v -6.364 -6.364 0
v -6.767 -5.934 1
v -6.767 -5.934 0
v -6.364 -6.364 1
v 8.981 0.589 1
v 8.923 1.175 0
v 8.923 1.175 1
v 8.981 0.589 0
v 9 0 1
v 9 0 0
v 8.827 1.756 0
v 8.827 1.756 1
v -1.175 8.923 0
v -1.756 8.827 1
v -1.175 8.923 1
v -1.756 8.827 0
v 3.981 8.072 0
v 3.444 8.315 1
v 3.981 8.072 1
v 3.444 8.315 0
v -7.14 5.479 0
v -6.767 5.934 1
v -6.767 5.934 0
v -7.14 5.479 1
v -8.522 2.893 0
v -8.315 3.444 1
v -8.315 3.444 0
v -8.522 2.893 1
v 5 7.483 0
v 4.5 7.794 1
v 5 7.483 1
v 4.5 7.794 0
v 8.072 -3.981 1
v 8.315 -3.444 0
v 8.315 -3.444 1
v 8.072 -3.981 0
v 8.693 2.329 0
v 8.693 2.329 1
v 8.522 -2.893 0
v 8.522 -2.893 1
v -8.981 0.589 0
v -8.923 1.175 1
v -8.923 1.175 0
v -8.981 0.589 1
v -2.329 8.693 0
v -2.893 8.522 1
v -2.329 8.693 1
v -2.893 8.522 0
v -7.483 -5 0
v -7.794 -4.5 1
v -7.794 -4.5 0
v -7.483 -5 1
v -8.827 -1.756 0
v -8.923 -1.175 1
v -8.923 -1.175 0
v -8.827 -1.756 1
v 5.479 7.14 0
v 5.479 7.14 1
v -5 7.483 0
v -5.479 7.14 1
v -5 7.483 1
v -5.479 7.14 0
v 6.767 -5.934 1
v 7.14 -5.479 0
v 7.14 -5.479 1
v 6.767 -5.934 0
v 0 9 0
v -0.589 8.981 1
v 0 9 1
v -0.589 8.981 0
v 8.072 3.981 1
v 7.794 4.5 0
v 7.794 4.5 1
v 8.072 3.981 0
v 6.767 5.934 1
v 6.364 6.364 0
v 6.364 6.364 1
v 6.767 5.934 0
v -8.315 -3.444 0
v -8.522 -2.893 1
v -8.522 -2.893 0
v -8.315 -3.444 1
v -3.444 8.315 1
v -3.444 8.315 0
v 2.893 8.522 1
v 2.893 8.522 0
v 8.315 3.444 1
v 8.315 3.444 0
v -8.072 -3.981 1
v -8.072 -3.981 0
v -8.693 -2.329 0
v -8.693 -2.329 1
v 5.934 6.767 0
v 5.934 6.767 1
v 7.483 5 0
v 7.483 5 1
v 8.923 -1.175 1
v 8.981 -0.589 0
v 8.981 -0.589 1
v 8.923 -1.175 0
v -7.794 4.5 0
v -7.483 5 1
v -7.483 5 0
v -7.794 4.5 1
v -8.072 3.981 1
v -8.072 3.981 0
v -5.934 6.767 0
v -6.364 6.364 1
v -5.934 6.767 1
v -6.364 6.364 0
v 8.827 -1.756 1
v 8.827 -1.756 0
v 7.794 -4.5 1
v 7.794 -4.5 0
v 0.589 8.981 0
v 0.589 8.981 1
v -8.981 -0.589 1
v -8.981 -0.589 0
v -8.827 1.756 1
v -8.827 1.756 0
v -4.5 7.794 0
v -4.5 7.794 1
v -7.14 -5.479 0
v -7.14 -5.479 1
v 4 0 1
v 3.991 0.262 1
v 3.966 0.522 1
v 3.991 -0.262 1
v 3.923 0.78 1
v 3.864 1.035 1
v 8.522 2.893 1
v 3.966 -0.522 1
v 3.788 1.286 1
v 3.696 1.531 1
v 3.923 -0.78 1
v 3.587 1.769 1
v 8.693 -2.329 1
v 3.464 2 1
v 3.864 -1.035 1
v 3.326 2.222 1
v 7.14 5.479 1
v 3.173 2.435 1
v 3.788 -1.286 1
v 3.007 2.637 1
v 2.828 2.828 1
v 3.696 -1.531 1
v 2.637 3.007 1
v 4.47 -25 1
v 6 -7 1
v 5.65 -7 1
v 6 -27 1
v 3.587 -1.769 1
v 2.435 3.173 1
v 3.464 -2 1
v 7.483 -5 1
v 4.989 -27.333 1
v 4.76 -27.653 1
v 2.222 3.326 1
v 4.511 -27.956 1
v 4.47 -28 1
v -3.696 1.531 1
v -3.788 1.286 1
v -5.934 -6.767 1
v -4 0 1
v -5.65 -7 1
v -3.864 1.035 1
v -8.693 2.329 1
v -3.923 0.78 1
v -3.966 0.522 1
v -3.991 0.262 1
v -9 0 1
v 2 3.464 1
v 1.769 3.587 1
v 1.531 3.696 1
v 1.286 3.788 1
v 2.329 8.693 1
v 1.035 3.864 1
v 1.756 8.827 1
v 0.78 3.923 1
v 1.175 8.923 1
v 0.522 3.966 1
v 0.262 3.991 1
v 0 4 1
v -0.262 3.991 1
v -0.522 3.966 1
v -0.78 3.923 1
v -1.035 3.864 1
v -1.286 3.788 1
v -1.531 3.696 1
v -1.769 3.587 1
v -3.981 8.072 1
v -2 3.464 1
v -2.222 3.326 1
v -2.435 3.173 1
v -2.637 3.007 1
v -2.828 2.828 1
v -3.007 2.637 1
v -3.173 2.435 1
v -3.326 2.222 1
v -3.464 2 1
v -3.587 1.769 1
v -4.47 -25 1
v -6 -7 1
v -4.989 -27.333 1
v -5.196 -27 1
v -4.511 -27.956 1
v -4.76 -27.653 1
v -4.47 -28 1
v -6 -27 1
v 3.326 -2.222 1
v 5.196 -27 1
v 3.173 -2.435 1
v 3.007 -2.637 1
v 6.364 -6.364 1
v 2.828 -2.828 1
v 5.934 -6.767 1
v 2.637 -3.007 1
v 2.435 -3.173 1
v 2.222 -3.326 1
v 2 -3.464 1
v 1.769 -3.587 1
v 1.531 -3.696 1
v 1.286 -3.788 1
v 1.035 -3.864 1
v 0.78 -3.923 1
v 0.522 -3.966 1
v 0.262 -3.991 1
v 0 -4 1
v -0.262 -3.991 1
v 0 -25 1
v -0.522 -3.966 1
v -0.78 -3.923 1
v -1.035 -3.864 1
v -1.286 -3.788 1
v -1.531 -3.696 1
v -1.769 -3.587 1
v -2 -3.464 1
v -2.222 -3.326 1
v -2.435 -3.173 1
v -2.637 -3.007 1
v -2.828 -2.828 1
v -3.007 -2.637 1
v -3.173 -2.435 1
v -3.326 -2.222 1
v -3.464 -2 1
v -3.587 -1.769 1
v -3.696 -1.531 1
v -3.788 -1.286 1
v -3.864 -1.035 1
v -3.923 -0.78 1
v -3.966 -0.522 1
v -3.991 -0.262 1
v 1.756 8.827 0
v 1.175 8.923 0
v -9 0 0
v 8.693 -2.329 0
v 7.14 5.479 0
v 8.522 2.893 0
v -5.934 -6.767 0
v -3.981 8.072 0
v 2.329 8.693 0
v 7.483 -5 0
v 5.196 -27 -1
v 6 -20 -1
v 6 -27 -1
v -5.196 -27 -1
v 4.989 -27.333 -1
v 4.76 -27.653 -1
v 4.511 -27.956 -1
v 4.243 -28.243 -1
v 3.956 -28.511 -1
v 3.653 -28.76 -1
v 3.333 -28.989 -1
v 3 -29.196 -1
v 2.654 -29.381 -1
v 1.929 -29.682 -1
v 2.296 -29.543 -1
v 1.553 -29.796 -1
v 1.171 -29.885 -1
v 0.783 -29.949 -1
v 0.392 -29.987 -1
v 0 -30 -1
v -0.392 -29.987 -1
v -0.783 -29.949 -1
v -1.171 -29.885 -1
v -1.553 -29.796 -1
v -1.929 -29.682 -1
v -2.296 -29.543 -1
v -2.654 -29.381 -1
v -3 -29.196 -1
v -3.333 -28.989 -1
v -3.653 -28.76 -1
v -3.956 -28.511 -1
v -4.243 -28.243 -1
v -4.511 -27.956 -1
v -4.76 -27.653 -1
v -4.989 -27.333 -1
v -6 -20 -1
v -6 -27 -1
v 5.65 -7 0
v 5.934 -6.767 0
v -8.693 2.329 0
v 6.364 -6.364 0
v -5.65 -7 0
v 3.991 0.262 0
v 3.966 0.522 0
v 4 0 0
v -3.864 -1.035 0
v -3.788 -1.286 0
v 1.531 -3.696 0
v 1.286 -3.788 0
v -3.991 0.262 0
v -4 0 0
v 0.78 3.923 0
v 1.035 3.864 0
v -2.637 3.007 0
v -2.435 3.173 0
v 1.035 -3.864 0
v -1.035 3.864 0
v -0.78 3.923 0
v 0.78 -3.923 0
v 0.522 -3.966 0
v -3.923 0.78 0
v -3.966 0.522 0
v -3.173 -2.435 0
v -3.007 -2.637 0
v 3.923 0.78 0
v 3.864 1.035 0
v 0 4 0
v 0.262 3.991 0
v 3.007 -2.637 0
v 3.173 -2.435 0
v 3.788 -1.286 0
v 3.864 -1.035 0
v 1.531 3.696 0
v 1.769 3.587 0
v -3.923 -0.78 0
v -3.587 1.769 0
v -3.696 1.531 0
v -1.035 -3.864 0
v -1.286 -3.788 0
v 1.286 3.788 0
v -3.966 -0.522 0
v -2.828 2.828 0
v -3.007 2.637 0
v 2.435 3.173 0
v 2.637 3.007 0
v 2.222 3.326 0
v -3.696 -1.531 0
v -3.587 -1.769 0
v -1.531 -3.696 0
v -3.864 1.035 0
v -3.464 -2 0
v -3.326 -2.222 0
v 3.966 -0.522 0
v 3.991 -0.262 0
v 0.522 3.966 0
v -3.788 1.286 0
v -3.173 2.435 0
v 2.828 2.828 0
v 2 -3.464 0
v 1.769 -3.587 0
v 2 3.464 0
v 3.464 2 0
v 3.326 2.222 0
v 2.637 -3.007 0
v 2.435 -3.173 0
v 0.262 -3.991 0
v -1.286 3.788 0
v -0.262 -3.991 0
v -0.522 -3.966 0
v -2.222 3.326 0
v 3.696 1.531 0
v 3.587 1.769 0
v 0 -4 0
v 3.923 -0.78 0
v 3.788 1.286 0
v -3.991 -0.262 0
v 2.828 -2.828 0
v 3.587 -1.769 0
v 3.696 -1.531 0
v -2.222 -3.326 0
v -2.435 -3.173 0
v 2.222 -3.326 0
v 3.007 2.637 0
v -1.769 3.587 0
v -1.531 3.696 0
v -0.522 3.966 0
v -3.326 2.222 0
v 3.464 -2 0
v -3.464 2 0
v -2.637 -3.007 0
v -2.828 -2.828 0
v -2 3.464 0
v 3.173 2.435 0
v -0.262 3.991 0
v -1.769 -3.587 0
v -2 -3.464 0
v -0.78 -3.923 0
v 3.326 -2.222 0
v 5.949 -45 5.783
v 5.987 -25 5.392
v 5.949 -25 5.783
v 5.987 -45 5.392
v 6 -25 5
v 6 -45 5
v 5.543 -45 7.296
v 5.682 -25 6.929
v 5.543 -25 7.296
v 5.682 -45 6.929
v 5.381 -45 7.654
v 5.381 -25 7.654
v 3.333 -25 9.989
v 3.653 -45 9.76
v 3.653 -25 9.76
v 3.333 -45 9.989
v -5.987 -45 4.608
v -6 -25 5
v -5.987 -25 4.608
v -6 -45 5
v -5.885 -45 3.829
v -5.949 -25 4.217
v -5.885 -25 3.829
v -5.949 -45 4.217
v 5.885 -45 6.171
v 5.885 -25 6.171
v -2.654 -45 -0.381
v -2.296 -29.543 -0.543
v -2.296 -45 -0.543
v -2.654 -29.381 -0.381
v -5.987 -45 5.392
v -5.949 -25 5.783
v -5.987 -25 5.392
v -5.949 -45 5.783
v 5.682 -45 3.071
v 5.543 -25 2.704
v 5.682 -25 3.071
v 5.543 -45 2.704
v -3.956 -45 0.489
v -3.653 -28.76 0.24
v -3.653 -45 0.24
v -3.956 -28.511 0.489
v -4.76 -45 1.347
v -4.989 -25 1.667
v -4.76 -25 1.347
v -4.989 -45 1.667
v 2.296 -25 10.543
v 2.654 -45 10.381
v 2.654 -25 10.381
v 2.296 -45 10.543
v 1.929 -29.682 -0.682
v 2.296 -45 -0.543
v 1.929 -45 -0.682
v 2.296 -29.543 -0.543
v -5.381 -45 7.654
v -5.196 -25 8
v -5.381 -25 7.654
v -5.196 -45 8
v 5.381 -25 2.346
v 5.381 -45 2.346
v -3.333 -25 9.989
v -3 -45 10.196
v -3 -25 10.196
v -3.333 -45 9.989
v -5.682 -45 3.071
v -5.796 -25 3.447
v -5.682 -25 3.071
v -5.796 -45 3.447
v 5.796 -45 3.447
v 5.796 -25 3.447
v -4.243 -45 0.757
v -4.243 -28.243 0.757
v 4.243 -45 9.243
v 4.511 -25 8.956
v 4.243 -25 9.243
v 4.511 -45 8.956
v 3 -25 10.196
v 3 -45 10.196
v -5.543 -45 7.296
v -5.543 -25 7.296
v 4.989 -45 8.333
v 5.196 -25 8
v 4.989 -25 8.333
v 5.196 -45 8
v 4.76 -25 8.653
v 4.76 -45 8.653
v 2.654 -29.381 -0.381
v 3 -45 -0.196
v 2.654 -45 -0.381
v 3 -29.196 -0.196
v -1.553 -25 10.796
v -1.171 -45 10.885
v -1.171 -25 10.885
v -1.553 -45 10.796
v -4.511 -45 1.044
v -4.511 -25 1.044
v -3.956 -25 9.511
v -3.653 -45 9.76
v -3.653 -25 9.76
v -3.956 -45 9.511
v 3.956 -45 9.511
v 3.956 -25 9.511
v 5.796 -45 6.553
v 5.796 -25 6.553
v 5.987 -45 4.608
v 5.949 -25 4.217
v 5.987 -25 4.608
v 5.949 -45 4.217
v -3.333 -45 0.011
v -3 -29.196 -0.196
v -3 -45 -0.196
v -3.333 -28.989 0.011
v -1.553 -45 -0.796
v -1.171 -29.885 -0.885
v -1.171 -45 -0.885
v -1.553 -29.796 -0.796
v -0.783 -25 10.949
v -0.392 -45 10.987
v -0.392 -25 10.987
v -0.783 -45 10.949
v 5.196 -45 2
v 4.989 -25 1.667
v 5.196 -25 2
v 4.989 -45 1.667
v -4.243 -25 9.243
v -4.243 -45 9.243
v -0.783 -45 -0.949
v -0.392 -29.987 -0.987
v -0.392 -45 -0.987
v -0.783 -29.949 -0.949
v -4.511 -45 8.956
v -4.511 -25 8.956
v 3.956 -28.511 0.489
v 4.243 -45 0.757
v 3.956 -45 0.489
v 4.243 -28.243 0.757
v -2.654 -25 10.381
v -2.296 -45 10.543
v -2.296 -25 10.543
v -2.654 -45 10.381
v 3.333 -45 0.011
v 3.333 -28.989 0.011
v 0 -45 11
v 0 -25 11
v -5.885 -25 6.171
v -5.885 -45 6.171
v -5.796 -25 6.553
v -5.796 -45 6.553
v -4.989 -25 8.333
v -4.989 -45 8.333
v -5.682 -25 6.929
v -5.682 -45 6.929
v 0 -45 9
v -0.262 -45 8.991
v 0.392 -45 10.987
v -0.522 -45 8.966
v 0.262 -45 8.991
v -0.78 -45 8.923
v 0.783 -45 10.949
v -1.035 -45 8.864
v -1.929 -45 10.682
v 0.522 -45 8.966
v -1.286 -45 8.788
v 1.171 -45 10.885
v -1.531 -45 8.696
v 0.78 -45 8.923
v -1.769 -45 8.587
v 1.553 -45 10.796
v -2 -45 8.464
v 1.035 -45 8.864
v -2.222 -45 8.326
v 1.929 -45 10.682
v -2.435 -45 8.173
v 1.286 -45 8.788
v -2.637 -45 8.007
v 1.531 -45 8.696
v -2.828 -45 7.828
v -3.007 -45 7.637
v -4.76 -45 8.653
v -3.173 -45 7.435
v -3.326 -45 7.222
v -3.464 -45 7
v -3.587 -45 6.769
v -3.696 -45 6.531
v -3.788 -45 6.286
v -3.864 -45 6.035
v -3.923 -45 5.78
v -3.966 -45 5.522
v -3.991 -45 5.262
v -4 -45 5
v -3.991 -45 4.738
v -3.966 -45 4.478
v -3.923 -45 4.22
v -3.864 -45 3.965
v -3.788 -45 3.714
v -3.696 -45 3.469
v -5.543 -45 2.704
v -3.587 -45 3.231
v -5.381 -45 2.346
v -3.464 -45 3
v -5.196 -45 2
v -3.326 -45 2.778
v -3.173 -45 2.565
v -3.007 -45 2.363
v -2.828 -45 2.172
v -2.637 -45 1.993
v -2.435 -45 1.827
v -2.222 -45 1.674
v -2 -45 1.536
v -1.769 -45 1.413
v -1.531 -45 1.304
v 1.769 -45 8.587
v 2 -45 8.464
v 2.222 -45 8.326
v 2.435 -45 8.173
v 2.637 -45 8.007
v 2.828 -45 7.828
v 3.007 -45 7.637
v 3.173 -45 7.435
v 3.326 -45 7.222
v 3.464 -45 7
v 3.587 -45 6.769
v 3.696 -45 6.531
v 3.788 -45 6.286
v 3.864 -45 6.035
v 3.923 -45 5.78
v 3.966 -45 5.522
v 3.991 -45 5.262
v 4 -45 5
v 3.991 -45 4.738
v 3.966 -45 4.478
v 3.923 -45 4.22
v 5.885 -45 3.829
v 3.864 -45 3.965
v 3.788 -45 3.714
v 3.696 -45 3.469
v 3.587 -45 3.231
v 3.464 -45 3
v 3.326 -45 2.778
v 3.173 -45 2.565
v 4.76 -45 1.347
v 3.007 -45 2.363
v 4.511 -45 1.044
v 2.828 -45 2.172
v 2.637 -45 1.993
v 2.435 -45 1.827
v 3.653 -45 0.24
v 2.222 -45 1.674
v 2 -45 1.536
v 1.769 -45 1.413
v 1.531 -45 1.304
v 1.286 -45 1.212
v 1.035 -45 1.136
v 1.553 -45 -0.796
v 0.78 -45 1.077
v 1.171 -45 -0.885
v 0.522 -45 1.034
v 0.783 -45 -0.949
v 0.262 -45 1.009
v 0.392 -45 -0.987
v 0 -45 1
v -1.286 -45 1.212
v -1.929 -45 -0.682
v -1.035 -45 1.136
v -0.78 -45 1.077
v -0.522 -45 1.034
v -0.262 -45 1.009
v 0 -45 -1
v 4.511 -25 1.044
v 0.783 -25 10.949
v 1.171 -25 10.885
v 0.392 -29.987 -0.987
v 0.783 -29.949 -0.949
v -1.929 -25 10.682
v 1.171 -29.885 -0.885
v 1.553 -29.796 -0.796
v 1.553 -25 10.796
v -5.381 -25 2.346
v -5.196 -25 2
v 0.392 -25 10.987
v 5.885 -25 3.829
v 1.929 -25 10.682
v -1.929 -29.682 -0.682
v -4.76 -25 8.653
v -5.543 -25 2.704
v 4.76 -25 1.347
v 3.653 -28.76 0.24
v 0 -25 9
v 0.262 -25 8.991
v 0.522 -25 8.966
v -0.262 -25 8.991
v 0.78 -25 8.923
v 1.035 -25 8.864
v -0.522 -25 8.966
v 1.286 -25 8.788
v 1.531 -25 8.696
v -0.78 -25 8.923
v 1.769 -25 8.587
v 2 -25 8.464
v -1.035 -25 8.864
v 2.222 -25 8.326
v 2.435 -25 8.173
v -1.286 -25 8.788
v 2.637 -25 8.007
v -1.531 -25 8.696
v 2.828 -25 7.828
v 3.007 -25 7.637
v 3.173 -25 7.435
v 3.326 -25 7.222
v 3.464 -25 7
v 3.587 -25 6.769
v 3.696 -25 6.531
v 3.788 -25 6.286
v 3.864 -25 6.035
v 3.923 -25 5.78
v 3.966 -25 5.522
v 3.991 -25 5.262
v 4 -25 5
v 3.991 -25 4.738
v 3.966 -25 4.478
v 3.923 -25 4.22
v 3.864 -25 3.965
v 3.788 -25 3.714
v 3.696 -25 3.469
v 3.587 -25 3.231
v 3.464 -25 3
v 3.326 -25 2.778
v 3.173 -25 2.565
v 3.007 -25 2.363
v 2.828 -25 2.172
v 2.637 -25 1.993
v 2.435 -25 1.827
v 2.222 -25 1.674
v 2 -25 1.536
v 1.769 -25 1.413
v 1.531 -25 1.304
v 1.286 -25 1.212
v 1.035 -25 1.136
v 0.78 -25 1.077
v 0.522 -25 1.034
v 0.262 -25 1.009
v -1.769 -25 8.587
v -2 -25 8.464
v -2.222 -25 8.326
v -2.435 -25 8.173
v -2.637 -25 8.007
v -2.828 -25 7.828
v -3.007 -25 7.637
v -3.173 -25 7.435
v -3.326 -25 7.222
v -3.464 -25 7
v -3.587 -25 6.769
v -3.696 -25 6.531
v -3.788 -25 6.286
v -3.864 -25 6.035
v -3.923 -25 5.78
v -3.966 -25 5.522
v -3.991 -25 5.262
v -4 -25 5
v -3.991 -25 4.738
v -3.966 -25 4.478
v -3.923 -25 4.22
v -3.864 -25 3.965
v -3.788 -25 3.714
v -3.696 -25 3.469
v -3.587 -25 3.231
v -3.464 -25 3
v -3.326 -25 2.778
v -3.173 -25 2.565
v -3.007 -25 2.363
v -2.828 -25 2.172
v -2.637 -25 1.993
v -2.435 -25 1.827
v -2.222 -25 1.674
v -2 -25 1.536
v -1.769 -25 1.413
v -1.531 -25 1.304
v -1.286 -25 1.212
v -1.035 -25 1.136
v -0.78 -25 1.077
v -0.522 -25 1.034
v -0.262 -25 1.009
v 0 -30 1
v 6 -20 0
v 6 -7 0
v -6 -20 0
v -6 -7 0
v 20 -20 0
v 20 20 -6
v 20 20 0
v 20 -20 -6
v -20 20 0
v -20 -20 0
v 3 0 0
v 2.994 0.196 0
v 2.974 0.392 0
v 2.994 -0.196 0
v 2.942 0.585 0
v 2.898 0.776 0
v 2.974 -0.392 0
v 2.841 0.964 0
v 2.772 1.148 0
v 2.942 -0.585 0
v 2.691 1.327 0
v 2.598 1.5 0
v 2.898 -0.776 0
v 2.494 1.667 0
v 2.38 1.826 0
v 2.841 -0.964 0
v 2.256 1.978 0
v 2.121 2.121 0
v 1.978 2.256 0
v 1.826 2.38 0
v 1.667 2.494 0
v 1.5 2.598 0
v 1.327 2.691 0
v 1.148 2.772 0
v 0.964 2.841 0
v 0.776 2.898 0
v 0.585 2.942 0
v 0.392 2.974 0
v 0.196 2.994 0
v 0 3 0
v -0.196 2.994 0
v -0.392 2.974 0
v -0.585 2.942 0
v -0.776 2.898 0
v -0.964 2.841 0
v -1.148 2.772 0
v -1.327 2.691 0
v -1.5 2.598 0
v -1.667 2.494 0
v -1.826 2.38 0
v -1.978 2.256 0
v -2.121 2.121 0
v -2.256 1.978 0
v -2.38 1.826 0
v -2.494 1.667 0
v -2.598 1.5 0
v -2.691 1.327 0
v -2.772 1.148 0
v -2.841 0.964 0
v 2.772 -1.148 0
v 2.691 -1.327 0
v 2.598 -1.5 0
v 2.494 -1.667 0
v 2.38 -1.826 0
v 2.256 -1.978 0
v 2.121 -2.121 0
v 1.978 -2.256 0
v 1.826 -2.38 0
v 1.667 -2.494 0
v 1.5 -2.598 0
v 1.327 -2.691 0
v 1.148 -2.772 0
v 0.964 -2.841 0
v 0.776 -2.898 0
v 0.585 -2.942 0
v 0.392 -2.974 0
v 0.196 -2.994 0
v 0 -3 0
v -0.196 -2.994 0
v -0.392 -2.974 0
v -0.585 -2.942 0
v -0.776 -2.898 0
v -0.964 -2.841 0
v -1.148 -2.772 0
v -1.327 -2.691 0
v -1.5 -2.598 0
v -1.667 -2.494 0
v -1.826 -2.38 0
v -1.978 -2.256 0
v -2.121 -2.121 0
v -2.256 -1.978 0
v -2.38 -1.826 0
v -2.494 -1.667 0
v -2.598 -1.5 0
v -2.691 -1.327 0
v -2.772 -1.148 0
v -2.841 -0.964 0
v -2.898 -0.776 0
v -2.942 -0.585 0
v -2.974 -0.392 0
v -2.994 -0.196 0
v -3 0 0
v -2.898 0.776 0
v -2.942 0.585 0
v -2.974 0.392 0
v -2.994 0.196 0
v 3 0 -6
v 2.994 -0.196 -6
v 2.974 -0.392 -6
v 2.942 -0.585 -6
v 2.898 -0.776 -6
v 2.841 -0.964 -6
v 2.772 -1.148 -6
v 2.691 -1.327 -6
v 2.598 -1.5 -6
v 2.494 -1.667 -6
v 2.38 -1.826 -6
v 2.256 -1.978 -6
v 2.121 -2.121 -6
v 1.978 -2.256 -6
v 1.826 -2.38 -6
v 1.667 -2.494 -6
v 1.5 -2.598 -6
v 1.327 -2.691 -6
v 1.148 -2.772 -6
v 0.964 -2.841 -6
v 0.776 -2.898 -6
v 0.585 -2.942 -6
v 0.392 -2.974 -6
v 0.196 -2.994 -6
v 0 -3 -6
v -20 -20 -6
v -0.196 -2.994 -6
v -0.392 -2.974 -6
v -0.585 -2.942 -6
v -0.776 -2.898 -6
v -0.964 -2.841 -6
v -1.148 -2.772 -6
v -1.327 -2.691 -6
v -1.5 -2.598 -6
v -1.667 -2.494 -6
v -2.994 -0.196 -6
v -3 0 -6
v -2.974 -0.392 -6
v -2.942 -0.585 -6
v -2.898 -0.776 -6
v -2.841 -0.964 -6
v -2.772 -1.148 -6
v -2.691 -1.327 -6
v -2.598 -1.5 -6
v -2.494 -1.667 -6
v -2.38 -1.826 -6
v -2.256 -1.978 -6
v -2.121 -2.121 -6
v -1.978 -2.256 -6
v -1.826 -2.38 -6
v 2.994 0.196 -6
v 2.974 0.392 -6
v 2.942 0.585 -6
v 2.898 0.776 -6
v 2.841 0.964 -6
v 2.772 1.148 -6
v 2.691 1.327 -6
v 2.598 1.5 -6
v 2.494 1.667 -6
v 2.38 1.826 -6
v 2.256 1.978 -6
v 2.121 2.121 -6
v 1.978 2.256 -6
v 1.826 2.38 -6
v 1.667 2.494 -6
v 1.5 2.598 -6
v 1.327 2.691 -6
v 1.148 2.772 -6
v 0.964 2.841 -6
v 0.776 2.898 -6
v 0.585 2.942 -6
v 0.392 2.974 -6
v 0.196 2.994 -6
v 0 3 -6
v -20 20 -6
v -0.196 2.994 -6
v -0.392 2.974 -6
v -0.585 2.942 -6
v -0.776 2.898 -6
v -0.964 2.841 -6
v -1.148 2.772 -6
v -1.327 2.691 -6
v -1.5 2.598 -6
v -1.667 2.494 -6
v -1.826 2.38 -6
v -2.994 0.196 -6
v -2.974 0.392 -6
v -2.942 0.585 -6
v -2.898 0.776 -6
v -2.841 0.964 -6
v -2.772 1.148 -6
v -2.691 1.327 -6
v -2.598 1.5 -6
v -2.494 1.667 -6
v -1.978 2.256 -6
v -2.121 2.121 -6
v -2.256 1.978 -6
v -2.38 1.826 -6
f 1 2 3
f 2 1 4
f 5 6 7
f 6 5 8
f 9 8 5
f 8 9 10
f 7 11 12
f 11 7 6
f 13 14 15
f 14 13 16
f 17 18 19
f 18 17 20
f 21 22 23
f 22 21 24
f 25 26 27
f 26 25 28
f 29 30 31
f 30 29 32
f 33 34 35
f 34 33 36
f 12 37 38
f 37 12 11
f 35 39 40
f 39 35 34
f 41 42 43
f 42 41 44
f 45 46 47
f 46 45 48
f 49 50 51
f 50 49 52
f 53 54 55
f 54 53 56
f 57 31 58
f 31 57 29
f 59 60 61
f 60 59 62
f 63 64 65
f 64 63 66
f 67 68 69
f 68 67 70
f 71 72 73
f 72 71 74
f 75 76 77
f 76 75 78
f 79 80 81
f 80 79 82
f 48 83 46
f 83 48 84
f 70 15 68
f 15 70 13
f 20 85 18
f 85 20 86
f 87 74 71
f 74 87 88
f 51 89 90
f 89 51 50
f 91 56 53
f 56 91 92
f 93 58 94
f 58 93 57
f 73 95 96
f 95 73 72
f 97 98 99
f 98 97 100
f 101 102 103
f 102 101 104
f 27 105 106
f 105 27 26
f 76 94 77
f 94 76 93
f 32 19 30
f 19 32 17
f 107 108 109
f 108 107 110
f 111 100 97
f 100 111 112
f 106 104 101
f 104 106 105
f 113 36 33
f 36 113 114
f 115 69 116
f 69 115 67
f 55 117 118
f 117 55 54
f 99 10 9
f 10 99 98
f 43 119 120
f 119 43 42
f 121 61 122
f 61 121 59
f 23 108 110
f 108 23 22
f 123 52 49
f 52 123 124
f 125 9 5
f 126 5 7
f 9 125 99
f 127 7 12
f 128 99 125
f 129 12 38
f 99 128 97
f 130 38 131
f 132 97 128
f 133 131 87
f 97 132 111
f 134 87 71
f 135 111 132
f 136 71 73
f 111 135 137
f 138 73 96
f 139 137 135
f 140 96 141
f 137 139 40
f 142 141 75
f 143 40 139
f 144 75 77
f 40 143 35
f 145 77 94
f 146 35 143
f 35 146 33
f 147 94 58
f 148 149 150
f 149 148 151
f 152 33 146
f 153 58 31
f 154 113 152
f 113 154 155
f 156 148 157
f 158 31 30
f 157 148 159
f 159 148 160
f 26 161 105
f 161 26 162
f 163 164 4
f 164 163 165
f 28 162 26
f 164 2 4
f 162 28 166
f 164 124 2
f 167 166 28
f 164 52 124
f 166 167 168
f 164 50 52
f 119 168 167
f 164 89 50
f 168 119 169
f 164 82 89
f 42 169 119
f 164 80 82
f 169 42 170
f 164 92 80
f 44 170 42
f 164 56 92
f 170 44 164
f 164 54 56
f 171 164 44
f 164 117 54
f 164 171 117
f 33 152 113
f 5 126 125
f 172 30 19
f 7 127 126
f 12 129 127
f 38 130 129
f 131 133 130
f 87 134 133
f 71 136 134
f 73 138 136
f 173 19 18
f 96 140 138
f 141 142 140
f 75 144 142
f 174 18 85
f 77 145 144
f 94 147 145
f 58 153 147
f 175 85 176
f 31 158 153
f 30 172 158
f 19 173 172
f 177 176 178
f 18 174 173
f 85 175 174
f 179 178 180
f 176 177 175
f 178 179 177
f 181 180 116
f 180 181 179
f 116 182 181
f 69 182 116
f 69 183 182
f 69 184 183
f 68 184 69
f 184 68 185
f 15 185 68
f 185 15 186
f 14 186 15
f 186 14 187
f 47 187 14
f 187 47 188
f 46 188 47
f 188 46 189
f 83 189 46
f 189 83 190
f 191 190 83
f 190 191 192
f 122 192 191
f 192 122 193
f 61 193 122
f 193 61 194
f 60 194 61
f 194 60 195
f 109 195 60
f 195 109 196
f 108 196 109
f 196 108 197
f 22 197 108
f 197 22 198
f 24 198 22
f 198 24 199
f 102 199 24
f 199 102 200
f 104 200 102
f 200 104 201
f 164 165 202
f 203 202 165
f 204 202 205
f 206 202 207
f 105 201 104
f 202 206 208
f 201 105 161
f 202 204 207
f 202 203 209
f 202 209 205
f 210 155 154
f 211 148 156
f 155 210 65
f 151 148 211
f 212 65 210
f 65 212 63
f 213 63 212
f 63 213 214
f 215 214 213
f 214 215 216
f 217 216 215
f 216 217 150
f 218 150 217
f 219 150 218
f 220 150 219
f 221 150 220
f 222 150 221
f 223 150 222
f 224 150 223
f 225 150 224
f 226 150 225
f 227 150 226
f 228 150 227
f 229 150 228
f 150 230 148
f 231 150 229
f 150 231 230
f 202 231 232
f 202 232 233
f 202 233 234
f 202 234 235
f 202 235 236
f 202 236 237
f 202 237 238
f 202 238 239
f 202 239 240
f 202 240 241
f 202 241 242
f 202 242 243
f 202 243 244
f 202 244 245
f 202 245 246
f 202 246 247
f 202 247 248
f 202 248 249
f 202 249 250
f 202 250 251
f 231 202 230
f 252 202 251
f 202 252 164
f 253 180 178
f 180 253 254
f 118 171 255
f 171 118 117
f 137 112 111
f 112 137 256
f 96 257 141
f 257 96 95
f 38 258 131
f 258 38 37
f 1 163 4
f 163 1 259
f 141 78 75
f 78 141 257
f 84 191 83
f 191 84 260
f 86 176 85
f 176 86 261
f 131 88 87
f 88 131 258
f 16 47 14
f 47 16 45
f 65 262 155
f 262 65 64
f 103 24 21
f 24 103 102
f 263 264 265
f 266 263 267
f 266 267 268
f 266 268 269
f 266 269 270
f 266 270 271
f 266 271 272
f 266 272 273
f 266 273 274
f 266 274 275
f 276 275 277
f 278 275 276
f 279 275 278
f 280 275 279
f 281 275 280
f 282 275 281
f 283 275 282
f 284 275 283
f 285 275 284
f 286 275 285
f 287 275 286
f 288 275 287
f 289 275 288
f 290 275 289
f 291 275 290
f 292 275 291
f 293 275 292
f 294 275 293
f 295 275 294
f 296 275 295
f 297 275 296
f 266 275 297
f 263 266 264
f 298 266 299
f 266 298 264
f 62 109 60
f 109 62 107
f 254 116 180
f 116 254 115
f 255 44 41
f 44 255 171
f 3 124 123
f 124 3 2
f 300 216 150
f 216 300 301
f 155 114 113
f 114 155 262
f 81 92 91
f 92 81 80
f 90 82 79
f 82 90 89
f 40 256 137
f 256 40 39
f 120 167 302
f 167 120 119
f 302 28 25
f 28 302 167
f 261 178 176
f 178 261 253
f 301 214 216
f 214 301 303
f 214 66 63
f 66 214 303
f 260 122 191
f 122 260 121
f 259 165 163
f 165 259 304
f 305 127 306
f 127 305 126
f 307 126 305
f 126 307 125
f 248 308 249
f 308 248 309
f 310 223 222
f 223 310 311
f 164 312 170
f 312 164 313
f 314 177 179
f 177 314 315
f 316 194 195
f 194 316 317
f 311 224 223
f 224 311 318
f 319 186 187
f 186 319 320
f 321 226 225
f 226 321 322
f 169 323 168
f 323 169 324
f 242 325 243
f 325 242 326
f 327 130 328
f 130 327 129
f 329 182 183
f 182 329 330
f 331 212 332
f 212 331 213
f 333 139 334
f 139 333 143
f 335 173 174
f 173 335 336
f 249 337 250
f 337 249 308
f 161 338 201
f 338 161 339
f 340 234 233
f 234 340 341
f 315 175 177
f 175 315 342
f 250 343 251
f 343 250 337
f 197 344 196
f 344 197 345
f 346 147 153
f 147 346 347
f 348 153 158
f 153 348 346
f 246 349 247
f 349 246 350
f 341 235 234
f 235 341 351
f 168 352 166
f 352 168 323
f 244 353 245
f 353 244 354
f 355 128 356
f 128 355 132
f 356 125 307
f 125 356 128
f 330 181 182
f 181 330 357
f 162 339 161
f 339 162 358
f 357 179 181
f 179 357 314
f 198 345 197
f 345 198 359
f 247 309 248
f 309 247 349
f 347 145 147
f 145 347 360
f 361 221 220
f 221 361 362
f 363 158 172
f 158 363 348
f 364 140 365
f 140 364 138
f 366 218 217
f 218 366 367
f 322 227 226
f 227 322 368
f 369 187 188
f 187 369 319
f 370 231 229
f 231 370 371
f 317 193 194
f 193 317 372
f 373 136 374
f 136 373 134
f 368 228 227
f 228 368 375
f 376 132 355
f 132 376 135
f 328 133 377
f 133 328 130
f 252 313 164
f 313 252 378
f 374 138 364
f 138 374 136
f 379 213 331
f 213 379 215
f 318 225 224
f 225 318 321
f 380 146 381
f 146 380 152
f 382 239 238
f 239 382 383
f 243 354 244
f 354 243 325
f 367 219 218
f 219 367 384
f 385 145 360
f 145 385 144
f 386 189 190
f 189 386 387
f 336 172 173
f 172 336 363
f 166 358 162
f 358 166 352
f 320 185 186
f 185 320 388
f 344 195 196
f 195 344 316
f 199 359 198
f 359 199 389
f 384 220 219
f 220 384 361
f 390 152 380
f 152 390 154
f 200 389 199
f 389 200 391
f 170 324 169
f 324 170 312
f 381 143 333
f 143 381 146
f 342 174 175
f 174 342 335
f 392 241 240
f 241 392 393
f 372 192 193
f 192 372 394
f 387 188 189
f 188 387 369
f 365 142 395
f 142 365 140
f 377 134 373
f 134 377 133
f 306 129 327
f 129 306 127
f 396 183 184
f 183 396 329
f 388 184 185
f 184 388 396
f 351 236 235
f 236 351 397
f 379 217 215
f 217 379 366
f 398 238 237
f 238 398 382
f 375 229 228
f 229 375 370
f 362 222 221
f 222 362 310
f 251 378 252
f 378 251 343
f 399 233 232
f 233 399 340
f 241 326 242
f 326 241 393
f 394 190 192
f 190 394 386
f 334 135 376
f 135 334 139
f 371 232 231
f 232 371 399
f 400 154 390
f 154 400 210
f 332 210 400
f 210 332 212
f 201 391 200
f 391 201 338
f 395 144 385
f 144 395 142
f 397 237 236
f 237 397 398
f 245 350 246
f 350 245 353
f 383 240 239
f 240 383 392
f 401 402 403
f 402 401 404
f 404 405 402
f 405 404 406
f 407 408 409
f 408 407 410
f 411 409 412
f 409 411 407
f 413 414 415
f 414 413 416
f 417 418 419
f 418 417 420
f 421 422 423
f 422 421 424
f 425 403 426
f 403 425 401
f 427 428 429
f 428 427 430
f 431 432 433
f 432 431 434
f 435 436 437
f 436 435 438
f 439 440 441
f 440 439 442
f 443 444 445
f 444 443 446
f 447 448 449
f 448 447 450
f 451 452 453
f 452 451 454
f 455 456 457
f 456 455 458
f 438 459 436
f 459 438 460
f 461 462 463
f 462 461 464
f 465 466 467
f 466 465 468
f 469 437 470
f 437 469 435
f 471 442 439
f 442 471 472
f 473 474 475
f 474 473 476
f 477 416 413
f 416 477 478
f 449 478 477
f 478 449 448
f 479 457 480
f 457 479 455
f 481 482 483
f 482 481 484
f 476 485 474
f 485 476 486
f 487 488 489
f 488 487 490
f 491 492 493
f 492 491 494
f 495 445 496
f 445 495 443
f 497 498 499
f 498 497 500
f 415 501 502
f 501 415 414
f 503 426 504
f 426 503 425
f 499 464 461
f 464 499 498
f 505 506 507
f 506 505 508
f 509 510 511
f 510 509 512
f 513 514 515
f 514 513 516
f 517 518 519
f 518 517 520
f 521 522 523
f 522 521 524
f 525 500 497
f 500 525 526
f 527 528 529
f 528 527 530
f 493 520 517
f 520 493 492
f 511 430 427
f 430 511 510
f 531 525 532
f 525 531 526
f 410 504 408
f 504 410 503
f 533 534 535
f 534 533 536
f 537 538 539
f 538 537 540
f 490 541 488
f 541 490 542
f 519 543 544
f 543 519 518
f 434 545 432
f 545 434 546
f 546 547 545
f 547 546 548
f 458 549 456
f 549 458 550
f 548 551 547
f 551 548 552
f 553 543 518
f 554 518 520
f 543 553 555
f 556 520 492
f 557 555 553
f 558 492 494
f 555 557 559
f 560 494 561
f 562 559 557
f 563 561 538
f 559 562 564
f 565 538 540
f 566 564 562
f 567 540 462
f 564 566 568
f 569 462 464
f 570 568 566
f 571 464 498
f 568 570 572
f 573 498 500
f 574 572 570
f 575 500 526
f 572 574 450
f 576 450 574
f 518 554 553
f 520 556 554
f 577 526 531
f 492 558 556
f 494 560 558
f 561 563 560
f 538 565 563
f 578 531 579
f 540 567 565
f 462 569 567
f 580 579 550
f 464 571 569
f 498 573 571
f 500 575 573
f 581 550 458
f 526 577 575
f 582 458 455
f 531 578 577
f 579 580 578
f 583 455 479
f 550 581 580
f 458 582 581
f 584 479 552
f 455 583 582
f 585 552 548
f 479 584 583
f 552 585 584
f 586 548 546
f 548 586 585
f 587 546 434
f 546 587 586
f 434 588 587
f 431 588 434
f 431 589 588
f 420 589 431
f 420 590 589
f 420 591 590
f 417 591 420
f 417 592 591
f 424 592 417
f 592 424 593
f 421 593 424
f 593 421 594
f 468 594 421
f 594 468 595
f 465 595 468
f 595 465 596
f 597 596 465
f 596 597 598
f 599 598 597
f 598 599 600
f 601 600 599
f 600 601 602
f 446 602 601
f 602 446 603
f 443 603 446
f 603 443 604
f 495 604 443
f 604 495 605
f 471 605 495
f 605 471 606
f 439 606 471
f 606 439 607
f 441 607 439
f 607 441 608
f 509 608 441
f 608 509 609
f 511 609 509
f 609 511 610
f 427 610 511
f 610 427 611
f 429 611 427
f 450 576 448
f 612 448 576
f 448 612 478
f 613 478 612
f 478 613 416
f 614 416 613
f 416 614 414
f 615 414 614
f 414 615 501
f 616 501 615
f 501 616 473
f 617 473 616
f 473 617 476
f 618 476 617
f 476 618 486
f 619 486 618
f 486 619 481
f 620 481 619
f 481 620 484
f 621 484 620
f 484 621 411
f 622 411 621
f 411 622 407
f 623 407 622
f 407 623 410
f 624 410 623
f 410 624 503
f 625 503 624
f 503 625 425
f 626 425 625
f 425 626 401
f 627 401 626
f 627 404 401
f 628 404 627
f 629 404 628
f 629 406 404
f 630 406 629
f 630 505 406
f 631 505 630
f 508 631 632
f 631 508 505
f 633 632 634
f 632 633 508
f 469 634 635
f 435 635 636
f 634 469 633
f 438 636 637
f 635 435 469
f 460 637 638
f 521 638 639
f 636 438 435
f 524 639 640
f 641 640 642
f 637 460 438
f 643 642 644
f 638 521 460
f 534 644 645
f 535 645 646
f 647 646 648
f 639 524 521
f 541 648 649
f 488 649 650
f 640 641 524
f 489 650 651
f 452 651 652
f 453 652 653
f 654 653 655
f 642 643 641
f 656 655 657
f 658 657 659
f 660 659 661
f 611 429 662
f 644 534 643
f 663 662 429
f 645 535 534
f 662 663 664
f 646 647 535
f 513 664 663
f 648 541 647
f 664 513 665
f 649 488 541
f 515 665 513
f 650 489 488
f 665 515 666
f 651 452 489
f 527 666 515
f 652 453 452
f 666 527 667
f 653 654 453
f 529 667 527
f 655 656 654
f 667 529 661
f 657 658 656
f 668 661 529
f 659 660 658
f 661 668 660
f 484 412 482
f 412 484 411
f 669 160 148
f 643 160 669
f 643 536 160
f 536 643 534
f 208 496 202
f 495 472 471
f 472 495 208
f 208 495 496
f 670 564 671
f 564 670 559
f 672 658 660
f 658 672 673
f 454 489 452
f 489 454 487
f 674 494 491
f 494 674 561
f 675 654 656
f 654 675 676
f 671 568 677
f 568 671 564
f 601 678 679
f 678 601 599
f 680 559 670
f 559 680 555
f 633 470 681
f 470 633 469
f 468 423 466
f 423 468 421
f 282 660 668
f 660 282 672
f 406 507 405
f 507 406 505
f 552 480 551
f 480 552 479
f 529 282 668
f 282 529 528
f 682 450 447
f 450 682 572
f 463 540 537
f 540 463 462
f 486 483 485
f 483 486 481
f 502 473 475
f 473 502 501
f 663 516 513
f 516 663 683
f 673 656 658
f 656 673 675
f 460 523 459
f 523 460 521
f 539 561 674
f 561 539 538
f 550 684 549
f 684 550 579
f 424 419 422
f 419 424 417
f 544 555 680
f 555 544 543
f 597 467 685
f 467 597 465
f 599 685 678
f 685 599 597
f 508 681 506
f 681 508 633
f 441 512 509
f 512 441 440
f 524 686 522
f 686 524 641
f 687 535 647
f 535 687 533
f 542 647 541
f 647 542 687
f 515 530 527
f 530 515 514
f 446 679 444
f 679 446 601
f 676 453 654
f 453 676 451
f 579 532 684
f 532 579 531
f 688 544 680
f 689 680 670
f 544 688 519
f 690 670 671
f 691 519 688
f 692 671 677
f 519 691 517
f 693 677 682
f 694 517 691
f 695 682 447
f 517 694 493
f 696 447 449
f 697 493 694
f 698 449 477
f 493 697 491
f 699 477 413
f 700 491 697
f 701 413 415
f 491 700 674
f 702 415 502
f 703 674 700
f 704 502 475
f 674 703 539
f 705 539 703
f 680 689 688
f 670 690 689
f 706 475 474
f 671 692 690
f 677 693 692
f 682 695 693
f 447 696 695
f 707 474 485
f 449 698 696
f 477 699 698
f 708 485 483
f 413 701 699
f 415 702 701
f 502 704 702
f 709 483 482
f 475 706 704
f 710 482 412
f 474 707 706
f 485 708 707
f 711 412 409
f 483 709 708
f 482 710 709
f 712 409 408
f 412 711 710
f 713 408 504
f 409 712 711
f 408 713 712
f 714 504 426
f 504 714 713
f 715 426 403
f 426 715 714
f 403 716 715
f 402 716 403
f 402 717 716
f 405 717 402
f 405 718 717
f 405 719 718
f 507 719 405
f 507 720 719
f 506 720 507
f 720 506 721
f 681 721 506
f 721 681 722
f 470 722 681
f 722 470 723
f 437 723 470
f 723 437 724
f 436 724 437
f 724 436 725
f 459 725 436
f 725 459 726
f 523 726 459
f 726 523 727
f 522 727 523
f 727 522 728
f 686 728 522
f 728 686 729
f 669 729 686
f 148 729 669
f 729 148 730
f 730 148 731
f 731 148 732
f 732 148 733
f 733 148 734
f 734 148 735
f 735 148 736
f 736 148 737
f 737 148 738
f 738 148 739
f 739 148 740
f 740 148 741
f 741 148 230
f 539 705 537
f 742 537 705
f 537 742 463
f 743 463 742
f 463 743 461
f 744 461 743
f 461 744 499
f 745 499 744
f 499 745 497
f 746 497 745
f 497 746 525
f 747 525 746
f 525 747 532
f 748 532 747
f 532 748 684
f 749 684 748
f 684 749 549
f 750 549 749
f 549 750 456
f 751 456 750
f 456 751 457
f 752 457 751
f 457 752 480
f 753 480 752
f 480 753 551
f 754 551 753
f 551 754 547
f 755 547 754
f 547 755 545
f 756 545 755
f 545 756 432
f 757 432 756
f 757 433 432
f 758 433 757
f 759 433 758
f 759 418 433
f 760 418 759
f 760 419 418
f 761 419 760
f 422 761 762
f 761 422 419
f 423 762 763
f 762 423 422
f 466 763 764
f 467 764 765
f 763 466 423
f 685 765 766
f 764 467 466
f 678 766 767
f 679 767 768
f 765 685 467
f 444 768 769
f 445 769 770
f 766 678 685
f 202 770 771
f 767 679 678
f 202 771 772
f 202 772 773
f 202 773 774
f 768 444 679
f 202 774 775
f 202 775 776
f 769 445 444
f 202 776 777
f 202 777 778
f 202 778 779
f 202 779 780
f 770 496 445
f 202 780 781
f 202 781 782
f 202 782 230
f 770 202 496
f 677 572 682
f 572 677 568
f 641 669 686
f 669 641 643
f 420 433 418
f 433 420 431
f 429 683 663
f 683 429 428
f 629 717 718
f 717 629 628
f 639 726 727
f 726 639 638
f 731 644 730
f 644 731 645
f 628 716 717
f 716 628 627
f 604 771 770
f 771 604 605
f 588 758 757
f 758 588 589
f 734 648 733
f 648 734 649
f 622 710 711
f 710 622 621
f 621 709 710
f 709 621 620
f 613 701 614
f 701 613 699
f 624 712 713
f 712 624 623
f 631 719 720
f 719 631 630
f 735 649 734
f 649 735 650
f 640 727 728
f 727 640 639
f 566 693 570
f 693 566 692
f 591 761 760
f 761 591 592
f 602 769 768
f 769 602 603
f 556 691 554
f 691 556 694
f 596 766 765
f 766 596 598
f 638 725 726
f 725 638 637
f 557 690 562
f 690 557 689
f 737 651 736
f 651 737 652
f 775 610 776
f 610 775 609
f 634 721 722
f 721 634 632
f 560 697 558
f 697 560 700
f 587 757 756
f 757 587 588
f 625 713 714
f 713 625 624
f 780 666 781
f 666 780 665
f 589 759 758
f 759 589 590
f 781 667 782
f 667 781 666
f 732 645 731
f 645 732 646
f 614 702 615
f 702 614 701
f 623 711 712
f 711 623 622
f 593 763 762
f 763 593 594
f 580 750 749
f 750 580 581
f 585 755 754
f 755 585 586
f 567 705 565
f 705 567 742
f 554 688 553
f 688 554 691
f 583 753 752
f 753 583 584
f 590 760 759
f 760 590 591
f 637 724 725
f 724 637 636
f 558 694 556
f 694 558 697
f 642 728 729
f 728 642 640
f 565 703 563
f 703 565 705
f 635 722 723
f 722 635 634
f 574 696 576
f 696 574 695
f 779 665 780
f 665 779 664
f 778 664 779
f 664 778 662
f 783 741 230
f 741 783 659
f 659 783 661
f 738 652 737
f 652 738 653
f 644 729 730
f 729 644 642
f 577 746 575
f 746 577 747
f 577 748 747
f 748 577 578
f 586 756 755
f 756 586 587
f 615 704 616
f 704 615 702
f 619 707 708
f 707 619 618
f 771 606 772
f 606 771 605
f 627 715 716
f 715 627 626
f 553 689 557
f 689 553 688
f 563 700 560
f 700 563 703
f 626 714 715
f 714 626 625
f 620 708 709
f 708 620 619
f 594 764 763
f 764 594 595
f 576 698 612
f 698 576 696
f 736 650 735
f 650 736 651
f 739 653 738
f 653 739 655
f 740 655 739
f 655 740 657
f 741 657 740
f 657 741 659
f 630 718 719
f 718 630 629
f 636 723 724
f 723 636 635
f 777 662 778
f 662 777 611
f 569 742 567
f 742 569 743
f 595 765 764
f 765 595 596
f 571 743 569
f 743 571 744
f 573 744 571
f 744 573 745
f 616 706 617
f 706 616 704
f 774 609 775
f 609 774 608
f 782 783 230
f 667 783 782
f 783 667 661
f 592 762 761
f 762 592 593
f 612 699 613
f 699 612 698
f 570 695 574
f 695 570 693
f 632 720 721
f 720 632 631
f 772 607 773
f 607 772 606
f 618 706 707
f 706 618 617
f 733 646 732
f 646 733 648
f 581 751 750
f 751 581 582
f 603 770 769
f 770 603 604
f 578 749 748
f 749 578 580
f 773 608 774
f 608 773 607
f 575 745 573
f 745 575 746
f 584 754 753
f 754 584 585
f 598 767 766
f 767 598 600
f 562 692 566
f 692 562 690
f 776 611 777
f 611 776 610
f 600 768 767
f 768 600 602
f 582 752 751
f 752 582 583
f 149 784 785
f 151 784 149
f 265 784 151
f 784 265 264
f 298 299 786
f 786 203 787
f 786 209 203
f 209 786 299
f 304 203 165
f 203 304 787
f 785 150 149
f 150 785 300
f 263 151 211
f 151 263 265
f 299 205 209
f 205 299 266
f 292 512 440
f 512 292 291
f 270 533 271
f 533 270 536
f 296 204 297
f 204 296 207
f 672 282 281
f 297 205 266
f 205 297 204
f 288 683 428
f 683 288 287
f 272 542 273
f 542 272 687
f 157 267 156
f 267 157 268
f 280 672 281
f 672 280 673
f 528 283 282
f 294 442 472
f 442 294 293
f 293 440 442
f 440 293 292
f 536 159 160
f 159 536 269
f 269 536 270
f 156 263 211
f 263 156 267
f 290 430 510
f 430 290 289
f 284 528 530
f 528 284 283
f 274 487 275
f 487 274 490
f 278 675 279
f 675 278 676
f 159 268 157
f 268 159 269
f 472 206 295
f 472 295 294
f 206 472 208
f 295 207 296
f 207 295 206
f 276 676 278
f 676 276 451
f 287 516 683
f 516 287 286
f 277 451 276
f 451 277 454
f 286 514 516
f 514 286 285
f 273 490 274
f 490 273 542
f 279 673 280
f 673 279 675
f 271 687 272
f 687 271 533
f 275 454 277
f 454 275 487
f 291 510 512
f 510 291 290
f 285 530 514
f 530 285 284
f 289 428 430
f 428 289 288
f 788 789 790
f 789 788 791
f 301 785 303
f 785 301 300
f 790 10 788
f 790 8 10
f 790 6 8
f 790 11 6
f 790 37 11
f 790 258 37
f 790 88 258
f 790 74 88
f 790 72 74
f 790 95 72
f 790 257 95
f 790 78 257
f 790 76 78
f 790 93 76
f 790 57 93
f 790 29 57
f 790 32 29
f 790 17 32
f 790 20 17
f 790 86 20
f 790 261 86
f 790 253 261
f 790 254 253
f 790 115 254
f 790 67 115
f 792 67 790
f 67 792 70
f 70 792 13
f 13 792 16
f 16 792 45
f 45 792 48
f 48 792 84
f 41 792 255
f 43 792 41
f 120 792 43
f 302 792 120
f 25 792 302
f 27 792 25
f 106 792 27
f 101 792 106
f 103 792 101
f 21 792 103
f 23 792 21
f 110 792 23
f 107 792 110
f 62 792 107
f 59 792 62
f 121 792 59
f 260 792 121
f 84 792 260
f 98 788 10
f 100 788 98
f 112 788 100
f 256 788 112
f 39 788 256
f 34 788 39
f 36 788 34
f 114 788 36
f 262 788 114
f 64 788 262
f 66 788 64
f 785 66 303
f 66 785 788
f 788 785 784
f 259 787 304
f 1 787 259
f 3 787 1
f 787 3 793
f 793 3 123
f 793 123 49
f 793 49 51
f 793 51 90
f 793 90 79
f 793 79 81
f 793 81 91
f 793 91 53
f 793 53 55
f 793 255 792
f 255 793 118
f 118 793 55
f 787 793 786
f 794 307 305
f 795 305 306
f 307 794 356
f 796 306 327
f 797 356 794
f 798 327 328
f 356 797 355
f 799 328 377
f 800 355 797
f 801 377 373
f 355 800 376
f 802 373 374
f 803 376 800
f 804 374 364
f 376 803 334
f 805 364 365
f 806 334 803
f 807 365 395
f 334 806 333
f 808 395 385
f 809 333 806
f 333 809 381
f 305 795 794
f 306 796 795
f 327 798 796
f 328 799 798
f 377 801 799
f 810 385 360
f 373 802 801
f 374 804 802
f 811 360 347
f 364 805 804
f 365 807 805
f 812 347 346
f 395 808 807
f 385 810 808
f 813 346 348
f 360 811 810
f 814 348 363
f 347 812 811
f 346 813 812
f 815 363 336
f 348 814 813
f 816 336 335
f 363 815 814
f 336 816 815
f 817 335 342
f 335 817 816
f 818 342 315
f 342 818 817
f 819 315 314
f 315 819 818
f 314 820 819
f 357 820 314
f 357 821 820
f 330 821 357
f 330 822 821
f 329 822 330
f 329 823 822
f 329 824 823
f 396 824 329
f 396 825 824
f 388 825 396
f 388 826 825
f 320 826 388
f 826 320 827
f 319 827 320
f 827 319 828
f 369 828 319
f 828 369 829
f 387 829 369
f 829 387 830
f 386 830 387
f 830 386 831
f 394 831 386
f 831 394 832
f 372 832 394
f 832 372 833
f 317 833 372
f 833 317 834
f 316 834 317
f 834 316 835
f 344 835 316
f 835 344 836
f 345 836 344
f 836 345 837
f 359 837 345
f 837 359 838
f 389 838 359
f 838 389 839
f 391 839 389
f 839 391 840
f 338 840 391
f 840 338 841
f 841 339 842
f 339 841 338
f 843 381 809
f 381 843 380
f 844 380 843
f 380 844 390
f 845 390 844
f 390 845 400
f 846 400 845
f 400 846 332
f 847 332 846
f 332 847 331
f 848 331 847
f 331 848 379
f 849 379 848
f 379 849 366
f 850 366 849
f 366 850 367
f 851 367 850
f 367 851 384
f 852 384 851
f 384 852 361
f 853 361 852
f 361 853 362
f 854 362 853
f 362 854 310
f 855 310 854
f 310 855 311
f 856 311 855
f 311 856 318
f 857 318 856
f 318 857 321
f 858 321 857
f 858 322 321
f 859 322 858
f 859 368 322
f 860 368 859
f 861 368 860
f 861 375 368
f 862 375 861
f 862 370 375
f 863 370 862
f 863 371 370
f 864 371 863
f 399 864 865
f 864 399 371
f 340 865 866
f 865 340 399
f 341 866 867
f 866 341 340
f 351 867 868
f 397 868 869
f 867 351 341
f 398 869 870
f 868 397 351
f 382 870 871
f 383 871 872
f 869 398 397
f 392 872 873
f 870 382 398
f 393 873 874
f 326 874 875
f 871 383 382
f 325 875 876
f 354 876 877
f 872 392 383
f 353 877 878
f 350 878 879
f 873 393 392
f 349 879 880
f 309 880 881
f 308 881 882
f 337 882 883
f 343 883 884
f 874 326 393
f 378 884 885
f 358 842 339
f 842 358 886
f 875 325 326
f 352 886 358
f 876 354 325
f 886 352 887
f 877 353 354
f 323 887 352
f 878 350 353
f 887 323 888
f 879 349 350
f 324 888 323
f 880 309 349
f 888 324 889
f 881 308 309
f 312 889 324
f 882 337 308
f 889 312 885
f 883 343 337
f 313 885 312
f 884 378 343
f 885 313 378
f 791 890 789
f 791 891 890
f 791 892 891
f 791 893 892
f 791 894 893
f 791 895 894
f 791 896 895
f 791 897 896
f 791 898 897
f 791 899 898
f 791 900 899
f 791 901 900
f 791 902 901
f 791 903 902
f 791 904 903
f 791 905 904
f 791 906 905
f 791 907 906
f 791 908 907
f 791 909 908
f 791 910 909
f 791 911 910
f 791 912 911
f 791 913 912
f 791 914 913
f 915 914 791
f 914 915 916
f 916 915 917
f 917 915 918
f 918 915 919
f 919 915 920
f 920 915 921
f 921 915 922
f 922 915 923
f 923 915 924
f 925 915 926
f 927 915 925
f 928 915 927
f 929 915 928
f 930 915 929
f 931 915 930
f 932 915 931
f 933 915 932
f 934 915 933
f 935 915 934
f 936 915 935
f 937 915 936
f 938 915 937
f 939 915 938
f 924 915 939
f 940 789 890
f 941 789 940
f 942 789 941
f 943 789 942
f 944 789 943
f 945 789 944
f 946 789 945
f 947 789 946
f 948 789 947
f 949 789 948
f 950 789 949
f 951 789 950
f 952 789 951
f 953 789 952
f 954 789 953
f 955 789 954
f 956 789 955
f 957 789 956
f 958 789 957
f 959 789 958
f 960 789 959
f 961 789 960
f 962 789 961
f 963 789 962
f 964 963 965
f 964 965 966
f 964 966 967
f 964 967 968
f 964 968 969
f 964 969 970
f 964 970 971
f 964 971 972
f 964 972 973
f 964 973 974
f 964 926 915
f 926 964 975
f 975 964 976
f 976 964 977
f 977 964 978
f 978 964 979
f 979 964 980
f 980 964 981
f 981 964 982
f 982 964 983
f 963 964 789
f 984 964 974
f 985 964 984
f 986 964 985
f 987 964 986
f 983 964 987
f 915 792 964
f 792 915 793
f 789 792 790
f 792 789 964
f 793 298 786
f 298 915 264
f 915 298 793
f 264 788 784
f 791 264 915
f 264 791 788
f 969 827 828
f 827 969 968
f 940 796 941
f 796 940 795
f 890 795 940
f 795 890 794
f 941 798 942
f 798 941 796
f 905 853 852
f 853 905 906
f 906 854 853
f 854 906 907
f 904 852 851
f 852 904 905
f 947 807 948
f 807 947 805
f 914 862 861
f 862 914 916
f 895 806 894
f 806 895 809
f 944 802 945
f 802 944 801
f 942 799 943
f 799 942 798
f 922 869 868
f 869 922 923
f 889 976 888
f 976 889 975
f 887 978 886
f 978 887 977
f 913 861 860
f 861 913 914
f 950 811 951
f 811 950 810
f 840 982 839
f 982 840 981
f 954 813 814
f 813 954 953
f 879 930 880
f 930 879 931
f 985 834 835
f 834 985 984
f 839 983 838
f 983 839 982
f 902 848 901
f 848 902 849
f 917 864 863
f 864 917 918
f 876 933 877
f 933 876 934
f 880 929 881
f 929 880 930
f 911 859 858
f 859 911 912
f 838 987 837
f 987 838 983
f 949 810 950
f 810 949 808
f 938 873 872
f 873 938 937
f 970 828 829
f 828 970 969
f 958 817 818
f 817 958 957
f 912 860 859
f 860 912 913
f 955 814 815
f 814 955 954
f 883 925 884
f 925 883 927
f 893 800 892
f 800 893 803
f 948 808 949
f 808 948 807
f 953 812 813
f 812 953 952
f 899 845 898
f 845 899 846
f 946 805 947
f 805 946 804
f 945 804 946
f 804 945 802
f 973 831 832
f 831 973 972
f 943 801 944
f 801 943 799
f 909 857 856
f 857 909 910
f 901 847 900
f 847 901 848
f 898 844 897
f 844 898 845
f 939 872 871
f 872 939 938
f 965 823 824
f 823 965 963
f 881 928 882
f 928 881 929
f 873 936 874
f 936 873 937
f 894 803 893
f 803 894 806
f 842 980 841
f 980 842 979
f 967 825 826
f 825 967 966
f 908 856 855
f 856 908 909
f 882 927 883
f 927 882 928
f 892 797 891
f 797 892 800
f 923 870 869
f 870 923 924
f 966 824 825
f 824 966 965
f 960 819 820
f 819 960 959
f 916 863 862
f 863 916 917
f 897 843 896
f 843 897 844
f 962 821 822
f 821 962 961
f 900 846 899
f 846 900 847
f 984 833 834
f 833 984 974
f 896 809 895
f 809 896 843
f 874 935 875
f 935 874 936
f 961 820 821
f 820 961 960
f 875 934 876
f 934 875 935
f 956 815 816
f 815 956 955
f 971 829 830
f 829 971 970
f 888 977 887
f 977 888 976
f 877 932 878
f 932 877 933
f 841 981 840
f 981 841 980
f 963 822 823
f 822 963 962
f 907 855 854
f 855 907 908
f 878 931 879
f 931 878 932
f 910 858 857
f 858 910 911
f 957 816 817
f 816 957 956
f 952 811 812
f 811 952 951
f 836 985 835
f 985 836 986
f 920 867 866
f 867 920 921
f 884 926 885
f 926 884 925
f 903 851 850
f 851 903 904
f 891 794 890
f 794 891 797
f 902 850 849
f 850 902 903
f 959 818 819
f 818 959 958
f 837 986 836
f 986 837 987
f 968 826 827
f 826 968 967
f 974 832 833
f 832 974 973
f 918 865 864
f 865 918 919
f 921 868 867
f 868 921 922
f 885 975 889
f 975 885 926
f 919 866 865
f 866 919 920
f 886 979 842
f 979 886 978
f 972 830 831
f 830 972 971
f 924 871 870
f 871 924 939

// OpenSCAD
// Parameters
type = 0; //[0:1:1]
thickness = 2; //[1:4:0.1]
width = 12; //[6:24:0.5]
outer_diameter = 18; //[9:36:0.5]
inner_diameter = 8; //[4:16:0.5]
overall_length = 45; //[25:90:1]
crimp_length = 18; //[8:36:1]
bolt_hole_diameter = 6; //[3:12:0.5]
bend_angle_deg = 45; //[0:75:1]
overlap = 1; //[0.5:2:0.1]
transition_length = 2; //[1:6:0.5]
wire_hole_diameter = 4; //[0:10:0.5]
assembly_plate_thickness = 6; //[3:12:0.5]
assembly_plate_size = 40; //[20:80:1]

$fn = 96;

// ---- Derived layout (Y axis is the terminal length direction) ----
ring_r = outer_diameter/2;

// Keep the original intent: overall_length measured from ring center to far end.
// Make the straight tab length such that: ring_r + tab_len + transition_length + crimp_length = overall_length
tab_len = max(0, overall_length - ring_r - transition_length - crimp_length);

// Segment centers along Y, with guaranteed overlaps between neighbors
y_ring = 0;
y_tab  = -(ring_r + tab_len/2 - overlap);
y_tran = -(ring_r + tab_len + transition_length/2 - overlap);
y_crmp = -(ring_r + tab_len + transition_length + crimp_length/2 - overlap);

// ---- Ring Terminal - complete geometry (single connected solid) ----
module ring_terminal() {
  color([0.8, 0.6, 0.2])  // Brass color
  union() {

    // Ring end (washer)
    difference() {
      translate([0, y_ring, 0])
        cylinder(r=outer_diameter/2, h=thickness, center=true);

      // Bolt hole (use the specified bolt hole diameter)
      translate([0, y_ring, 0])
        cylinder(r=bolt_hole_diameter/2, h=thickness + 2*overlap, center=true);

      // Inner clearance (keep as in original; if larger than bolt hole it will dominate)
      translate([0, y_ring, 0])
        cylinder(r=inner_diameter/2, h=thickness + 2*overlap, center=true);
    }

    // Flat tab body (overlaps ring by 'overlap')
    translate([0, y_tab, 0])
      cube([width, tab_len + 2*overlap, thickness], center=true);

    // Transition block (overlaps tab and crimp by 'overlap')
    translate([0, y_tran, 0])
      cube([width, transition_length + 2*overlap, thickness], center=true);

    // Crimp barrel shell (position recalculated to touch/overlap transition)
    // Axis along Y (rotate 90deg about X), centered at y_crmp.
    // Z positioned so the barrel sits on the same "top surface" as the flat tab (as in original intent),
    // and overlaps the transition slightly in Y.
    difference() {
      translate([0, y_crmp, width/2 - thickness/2])
        rotate([90, 0, 0])
          cylinder(r=width/2, h=crimp_length + 2*overlap, center=true);

      translate([0, y_crmp, width/2 - thickness/2])
        rotate([90, 0, 0])
          cylinder(r=width/2 - thickness, h=crimp_length + 4*overlap, center=true);
    }
  }
}

// ---- Ring Terminal Assembly - wire-hole end (attached to far end of tab) ----
module ring_terminal_assembly() {
  // Place this at the far end of the flat tab (end opposite the ring),
  // overlapping the tab by 'overlap' so it is not disconnected.
  y_wire = -(ring_r + tab_len - overlap);

  color([0.8, 0.6, 0.2])  // Brass color
  union() {
    difference() {
      translate([0, y_wire, 0])
        cylinder(r=width/2, h=thickness, center=true);

      translate([0, y_wire, 0])
        cylinder(r=wire_hole_diameter/2, h=thickness + 2*overlap, center=true);
    }
  }
}

// ---- Assembly Plate (kept as separate part, but unioned into one solid per requirements) ----
module assembly_plate() {
  color([0.75, 0.75, 0.77]) { // Aluminum color
    difference() {
      translate([0, 0, -(assembly_plate_thickness/2 + thickness/2 - overlap)])
        cube([assembly_plate_size, assembly_plate_size, assembly_plate_thickness], center=true);

      translate([0, 0, -(assembly_plate_thickness/2 + thickness/2 - overlap)])
        cylinder(r=bolt_hole_diameter/2, h=assembly_plate_thickness + 2*overlap, center=true);
    }
  }
}

// ---- Final Assembly (single union so nothing is disconnected) ----
module assembly() {
  union() {
    ring_terminal();
    ring_terminal_assembly();
    assembly_plate();
  }
}

assembly();
